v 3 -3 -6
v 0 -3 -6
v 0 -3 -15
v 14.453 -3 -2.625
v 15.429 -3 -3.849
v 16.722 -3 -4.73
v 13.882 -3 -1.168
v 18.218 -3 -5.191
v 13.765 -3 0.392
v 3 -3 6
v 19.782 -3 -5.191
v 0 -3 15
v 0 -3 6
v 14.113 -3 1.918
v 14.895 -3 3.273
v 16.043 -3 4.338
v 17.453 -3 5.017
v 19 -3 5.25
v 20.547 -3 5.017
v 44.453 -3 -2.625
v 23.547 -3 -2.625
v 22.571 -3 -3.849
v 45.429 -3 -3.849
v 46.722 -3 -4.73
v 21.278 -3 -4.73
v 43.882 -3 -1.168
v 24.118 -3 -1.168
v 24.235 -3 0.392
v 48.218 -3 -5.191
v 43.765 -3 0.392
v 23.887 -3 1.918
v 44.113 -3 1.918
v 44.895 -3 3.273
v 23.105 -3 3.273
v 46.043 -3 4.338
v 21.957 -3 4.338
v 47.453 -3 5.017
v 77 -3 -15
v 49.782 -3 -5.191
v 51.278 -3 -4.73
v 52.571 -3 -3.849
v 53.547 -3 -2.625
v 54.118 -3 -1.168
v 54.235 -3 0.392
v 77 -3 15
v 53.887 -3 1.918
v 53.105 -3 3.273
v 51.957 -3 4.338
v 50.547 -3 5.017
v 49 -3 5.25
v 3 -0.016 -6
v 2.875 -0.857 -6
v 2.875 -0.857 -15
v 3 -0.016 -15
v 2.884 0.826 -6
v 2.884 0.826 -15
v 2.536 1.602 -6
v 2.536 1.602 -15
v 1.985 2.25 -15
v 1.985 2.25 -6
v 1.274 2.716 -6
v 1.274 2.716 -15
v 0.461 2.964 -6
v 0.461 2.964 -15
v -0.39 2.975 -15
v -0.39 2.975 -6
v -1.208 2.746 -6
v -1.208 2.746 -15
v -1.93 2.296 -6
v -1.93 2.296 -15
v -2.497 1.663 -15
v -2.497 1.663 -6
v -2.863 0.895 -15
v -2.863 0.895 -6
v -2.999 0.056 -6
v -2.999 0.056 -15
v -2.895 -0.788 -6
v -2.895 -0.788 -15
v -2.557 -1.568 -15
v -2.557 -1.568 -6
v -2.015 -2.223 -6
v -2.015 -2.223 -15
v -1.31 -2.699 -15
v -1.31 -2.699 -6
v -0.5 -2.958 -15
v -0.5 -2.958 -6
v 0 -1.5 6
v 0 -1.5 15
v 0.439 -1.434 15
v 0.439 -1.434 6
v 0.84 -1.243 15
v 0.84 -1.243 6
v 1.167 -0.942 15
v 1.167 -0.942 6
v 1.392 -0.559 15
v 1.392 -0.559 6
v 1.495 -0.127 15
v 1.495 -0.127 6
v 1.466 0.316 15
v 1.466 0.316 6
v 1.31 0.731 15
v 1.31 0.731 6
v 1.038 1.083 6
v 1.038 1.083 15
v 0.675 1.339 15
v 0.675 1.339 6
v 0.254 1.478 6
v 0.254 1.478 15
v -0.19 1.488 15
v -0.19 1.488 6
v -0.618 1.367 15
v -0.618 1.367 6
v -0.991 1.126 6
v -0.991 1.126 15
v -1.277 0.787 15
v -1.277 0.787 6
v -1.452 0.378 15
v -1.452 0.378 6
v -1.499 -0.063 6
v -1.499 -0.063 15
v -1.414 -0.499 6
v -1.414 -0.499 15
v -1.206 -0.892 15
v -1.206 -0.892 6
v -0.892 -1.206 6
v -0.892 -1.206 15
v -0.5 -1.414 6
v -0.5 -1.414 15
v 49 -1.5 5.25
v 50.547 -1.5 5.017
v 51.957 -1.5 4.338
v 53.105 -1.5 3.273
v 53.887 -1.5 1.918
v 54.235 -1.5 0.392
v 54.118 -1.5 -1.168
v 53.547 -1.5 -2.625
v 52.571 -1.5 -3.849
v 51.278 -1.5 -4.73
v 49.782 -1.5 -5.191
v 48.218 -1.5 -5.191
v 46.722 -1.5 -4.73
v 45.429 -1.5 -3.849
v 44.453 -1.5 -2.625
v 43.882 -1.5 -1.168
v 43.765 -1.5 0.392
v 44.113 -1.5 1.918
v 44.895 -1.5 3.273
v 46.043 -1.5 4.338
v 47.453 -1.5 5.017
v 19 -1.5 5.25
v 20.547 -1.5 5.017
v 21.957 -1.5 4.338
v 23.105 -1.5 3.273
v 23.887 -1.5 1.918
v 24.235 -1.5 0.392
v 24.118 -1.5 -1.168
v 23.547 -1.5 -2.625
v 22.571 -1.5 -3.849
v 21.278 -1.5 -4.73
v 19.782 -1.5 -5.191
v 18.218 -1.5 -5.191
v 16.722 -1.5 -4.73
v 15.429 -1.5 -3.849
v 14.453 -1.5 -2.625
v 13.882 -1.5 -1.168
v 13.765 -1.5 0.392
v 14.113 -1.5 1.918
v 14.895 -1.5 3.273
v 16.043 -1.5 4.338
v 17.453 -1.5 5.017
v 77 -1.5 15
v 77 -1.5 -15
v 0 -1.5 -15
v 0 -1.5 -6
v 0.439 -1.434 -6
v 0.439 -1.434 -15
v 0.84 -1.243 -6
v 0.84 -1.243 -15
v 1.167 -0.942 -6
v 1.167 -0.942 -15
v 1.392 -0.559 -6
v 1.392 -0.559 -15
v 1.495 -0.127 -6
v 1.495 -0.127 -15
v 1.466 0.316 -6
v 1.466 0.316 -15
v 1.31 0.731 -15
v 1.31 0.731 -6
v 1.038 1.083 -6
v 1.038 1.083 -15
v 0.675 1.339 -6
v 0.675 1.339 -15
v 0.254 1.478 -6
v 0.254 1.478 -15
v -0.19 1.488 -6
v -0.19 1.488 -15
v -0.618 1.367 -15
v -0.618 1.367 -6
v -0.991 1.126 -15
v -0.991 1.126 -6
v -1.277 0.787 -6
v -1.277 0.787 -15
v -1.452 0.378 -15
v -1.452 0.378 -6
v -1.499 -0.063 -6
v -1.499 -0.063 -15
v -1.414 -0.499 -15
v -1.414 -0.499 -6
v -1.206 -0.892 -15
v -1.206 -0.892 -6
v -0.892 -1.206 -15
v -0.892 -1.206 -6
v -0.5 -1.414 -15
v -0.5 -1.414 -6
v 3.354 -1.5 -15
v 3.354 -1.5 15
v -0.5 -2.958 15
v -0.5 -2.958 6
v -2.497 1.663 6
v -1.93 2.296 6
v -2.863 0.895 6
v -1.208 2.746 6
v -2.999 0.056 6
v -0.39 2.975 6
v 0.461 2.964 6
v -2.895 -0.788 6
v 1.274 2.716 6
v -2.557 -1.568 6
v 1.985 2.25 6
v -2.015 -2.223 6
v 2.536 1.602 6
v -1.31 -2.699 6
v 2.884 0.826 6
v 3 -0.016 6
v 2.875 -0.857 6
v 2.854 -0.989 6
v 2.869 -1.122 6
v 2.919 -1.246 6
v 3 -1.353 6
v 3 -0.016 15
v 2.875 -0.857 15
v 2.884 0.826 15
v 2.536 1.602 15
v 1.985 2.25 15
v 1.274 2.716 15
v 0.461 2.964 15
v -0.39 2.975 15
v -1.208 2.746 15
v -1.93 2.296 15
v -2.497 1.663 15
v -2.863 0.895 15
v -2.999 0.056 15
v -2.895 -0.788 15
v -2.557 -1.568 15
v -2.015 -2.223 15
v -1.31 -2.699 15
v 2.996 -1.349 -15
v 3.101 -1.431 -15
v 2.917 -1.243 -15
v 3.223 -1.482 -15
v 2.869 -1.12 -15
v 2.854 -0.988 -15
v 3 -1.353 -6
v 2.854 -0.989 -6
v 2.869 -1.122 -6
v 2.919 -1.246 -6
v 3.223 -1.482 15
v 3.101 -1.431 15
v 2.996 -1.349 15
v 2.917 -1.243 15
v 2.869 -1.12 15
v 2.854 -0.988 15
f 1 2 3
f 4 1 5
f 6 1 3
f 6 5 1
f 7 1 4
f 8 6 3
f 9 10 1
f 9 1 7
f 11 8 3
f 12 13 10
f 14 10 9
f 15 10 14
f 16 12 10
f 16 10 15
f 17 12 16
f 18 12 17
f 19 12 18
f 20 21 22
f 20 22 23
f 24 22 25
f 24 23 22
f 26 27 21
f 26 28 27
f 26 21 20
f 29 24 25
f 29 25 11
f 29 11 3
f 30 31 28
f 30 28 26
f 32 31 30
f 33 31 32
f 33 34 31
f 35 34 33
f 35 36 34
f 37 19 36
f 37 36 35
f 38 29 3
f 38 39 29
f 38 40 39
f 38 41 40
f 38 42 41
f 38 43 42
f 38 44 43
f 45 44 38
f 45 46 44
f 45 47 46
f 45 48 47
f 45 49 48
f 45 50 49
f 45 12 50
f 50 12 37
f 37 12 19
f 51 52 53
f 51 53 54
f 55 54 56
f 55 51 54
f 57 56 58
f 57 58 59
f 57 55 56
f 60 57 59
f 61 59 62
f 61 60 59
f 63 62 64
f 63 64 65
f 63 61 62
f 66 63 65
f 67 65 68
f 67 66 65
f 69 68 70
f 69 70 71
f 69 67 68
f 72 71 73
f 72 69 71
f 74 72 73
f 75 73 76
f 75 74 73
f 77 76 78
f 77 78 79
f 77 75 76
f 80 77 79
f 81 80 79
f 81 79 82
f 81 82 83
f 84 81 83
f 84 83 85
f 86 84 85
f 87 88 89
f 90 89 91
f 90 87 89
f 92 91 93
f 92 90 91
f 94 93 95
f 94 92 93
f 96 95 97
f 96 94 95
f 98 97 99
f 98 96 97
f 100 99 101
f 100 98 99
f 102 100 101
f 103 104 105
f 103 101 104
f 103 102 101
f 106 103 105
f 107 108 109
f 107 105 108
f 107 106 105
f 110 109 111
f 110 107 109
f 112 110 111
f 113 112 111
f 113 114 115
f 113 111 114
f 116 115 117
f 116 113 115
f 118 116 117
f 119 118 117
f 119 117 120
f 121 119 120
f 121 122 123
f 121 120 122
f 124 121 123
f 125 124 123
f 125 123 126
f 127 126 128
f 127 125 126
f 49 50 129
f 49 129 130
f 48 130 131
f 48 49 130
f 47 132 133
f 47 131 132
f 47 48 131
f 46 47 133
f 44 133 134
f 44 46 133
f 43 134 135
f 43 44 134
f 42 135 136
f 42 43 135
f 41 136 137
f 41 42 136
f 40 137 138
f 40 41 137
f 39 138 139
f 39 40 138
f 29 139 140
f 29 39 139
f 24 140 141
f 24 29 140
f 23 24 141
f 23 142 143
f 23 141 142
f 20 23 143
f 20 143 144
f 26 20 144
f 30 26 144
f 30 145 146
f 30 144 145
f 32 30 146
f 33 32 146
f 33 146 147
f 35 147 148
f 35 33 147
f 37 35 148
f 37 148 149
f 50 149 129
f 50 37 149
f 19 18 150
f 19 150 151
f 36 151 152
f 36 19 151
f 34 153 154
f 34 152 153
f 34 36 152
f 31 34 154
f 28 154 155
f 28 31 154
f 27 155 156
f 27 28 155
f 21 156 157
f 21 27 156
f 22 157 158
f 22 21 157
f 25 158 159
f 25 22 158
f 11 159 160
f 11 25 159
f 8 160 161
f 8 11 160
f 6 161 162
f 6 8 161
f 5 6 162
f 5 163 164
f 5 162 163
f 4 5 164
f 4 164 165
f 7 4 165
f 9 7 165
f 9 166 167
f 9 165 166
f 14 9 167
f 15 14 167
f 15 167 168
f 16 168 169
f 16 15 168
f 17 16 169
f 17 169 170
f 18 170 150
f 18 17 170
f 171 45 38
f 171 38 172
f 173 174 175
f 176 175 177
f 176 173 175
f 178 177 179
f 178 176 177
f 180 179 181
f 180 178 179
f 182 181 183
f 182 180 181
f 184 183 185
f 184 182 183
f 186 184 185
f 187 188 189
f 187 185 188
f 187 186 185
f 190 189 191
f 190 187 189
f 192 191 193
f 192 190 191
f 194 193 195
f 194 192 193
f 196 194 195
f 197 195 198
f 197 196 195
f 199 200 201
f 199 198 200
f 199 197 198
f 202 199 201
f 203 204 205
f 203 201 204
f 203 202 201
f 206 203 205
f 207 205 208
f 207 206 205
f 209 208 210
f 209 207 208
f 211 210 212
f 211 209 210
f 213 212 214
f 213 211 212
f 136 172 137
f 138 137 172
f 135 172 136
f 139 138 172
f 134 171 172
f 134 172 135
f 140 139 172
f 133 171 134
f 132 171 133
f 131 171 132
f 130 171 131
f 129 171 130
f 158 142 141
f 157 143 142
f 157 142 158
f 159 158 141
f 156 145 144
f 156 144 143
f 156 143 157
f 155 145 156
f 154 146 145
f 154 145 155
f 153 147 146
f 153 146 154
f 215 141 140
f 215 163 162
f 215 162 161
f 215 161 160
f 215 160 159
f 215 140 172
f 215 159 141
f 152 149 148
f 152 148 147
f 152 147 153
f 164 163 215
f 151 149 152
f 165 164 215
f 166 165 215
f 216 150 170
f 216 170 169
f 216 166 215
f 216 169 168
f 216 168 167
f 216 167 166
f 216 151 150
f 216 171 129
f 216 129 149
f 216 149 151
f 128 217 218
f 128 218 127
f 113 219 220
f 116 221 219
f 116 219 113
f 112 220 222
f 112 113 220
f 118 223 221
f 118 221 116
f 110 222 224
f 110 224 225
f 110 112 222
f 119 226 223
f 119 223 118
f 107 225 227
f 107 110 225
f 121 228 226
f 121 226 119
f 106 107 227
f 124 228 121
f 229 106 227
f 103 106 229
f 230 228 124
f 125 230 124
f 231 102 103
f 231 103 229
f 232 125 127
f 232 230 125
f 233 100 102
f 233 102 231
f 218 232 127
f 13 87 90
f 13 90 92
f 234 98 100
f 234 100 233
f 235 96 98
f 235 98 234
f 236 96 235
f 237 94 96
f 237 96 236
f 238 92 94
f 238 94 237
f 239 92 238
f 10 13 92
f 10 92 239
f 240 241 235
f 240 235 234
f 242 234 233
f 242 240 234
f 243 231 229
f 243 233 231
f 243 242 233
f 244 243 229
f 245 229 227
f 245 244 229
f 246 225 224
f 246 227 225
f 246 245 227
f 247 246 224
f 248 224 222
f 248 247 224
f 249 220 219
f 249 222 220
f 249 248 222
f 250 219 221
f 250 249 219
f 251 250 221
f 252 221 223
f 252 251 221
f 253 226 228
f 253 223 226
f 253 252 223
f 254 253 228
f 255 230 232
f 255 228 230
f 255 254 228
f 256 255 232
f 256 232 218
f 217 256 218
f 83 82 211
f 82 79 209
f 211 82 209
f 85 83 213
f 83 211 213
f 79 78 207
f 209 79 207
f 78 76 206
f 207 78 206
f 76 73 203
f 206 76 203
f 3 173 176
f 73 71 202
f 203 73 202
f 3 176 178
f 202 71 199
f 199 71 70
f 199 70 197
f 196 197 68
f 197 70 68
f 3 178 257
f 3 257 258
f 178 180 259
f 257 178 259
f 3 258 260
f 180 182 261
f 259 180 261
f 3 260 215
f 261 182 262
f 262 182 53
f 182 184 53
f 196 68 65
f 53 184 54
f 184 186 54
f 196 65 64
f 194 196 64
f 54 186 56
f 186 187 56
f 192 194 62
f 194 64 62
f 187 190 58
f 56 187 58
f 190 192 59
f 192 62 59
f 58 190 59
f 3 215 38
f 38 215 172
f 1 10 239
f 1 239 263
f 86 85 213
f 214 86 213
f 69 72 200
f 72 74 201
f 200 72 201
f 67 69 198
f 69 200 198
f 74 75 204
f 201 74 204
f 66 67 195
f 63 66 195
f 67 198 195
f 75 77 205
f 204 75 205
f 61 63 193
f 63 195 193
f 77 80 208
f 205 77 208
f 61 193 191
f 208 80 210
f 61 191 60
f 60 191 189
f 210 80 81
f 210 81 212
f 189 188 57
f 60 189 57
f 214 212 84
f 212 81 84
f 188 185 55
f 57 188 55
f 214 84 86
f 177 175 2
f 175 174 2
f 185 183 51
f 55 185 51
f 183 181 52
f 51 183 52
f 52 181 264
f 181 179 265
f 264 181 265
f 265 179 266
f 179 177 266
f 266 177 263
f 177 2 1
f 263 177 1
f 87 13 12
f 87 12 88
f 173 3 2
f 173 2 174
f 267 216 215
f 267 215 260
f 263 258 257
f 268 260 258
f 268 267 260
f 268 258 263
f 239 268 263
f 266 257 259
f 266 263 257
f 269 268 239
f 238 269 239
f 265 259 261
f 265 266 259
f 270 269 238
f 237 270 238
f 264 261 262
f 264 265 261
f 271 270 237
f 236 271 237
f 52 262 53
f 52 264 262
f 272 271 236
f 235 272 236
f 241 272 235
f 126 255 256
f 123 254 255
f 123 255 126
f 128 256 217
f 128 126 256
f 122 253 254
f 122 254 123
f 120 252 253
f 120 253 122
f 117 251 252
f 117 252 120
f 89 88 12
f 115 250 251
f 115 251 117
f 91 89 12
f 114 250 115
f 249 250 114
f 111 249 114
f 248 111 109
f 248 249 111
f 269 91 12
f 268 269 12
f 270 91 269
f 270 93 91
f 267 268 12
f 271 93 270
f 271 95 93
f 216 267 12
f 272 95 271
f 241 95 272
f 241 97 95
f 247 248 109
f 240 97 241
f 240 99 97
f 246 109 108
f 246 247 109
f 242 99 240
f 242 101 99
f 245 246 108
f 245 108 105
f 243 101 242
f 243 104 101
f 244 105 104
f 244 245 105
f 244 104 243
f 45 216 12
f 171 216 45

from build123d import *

# Parameters (mm, degrees)
SKETCH_1_R               = 1.5
EXTRUDE_1_DEPTH          = 15
CUT_EXTRUDE_2_DEPTH      = 79.576395947
CUT_EXTRUDE_2_DEPTH_BACK = 79.576395947
SKETCH_2_W               = 6
SKETCH_2_H               = 12
CUT_EXTRUDE_3_DEPTH      = 83.692200358
CUT_EXTRUDE_3_DEPTH_BACK = 83.692200358
SKETCH_3_W               = 0.5
SKETCH_3_H               = 10
CUT_EXTRUDE_4_DEPTH      = 79.576395947
CUT_EXTRUDE_4_DEPTH_BACK = 79.576395947
SKETCH_4_R               = 5.25


with BuildPart() as part:
    # 草图1 → 凸台-拉伸1 (new, symmetric)
    with BuildSketch(Plane.XY):
        with BuildLine():
            Line((0, -3), (77, -3))
            Line((77, -3), (77, -1.5))
            Line((77, -1.5), (3.354101966, -1.5))
            ThreePointArc((3.354101966, -1.5), (2.953210103, -1.298807152), (2.874944542, -0.857142857))
            ThreePointArc((2.874944542, -0.857142857), (-1.792842914, 2.405351177), (0, -3))
        make_face()
        Circle(SKETCH_1_R, mode=Mode.SUBTRACT)
    extrude(amount=EXTRUDE_1_DEPTH, both=True)

    # 草图2 → 切除-拉伸2 (cut, two sides: drawn at the far end of the back side and taken through both)
    with BuildSketch(Plane(origin=(0, -1.5, 0), x_dir=(1, 0, 0), z_dir=(0, 1, 0)).offset(-CUT_EXTRUDE_2_DEPTH_BACK)):
        Rectangle(SKETCH_2_W, SKETCH_2_H)
    extrude(amount=CUT_EXTRUDE_2_DEPTH + CUT_EXTRUDE_2_DEPTH_BACK, mode=Mode.SUBTRACT)

    # 草图3 → 切除-拉伸3 (cut, two sides: drawn at the far end of the back side and taken through both)
    with BuildSketch(Plane.XY.offset(15).offset(-CUT_EXTRUDE_3_DEPTH_BACK)):
        with Locations((-0.25, -5)):
            Rectangle(SKETCH_3_W, SKETCH_3_H)
    extrude(amount=CUT_EXTRUDE_3_DEPTH + CUT_EXTRUDE_3_DEPTH_BACK, mode=Mode.SUBTRACT)

    # 草图4 → 切除-拉伸4 (cut, two sides: drawn at the far end of the back side and taken through both)
    with BuildSketch(Plane(origin=(0, -1.5, 0), x_dir=(1, 0, 0), z_dir=(0, 1, 0)).offset(-CUT_EXTRUDE_4_DEPTH_BACK)):
        with Locations(Location((19, 0, 0), (0, 0, 270))):
            Circle(SKETCH_4_R)
        with Locations(Location((49, 0, 0), (0, 0, 270))):
            Circle(SKETCH_4_R)
    extrude(amount=CUT_EXTRUDE_4_DEPTH + CUT_EXTRUDE_4_DEPTH_BACK, mode=Mode.SUBTRACT)


solid = part.part
